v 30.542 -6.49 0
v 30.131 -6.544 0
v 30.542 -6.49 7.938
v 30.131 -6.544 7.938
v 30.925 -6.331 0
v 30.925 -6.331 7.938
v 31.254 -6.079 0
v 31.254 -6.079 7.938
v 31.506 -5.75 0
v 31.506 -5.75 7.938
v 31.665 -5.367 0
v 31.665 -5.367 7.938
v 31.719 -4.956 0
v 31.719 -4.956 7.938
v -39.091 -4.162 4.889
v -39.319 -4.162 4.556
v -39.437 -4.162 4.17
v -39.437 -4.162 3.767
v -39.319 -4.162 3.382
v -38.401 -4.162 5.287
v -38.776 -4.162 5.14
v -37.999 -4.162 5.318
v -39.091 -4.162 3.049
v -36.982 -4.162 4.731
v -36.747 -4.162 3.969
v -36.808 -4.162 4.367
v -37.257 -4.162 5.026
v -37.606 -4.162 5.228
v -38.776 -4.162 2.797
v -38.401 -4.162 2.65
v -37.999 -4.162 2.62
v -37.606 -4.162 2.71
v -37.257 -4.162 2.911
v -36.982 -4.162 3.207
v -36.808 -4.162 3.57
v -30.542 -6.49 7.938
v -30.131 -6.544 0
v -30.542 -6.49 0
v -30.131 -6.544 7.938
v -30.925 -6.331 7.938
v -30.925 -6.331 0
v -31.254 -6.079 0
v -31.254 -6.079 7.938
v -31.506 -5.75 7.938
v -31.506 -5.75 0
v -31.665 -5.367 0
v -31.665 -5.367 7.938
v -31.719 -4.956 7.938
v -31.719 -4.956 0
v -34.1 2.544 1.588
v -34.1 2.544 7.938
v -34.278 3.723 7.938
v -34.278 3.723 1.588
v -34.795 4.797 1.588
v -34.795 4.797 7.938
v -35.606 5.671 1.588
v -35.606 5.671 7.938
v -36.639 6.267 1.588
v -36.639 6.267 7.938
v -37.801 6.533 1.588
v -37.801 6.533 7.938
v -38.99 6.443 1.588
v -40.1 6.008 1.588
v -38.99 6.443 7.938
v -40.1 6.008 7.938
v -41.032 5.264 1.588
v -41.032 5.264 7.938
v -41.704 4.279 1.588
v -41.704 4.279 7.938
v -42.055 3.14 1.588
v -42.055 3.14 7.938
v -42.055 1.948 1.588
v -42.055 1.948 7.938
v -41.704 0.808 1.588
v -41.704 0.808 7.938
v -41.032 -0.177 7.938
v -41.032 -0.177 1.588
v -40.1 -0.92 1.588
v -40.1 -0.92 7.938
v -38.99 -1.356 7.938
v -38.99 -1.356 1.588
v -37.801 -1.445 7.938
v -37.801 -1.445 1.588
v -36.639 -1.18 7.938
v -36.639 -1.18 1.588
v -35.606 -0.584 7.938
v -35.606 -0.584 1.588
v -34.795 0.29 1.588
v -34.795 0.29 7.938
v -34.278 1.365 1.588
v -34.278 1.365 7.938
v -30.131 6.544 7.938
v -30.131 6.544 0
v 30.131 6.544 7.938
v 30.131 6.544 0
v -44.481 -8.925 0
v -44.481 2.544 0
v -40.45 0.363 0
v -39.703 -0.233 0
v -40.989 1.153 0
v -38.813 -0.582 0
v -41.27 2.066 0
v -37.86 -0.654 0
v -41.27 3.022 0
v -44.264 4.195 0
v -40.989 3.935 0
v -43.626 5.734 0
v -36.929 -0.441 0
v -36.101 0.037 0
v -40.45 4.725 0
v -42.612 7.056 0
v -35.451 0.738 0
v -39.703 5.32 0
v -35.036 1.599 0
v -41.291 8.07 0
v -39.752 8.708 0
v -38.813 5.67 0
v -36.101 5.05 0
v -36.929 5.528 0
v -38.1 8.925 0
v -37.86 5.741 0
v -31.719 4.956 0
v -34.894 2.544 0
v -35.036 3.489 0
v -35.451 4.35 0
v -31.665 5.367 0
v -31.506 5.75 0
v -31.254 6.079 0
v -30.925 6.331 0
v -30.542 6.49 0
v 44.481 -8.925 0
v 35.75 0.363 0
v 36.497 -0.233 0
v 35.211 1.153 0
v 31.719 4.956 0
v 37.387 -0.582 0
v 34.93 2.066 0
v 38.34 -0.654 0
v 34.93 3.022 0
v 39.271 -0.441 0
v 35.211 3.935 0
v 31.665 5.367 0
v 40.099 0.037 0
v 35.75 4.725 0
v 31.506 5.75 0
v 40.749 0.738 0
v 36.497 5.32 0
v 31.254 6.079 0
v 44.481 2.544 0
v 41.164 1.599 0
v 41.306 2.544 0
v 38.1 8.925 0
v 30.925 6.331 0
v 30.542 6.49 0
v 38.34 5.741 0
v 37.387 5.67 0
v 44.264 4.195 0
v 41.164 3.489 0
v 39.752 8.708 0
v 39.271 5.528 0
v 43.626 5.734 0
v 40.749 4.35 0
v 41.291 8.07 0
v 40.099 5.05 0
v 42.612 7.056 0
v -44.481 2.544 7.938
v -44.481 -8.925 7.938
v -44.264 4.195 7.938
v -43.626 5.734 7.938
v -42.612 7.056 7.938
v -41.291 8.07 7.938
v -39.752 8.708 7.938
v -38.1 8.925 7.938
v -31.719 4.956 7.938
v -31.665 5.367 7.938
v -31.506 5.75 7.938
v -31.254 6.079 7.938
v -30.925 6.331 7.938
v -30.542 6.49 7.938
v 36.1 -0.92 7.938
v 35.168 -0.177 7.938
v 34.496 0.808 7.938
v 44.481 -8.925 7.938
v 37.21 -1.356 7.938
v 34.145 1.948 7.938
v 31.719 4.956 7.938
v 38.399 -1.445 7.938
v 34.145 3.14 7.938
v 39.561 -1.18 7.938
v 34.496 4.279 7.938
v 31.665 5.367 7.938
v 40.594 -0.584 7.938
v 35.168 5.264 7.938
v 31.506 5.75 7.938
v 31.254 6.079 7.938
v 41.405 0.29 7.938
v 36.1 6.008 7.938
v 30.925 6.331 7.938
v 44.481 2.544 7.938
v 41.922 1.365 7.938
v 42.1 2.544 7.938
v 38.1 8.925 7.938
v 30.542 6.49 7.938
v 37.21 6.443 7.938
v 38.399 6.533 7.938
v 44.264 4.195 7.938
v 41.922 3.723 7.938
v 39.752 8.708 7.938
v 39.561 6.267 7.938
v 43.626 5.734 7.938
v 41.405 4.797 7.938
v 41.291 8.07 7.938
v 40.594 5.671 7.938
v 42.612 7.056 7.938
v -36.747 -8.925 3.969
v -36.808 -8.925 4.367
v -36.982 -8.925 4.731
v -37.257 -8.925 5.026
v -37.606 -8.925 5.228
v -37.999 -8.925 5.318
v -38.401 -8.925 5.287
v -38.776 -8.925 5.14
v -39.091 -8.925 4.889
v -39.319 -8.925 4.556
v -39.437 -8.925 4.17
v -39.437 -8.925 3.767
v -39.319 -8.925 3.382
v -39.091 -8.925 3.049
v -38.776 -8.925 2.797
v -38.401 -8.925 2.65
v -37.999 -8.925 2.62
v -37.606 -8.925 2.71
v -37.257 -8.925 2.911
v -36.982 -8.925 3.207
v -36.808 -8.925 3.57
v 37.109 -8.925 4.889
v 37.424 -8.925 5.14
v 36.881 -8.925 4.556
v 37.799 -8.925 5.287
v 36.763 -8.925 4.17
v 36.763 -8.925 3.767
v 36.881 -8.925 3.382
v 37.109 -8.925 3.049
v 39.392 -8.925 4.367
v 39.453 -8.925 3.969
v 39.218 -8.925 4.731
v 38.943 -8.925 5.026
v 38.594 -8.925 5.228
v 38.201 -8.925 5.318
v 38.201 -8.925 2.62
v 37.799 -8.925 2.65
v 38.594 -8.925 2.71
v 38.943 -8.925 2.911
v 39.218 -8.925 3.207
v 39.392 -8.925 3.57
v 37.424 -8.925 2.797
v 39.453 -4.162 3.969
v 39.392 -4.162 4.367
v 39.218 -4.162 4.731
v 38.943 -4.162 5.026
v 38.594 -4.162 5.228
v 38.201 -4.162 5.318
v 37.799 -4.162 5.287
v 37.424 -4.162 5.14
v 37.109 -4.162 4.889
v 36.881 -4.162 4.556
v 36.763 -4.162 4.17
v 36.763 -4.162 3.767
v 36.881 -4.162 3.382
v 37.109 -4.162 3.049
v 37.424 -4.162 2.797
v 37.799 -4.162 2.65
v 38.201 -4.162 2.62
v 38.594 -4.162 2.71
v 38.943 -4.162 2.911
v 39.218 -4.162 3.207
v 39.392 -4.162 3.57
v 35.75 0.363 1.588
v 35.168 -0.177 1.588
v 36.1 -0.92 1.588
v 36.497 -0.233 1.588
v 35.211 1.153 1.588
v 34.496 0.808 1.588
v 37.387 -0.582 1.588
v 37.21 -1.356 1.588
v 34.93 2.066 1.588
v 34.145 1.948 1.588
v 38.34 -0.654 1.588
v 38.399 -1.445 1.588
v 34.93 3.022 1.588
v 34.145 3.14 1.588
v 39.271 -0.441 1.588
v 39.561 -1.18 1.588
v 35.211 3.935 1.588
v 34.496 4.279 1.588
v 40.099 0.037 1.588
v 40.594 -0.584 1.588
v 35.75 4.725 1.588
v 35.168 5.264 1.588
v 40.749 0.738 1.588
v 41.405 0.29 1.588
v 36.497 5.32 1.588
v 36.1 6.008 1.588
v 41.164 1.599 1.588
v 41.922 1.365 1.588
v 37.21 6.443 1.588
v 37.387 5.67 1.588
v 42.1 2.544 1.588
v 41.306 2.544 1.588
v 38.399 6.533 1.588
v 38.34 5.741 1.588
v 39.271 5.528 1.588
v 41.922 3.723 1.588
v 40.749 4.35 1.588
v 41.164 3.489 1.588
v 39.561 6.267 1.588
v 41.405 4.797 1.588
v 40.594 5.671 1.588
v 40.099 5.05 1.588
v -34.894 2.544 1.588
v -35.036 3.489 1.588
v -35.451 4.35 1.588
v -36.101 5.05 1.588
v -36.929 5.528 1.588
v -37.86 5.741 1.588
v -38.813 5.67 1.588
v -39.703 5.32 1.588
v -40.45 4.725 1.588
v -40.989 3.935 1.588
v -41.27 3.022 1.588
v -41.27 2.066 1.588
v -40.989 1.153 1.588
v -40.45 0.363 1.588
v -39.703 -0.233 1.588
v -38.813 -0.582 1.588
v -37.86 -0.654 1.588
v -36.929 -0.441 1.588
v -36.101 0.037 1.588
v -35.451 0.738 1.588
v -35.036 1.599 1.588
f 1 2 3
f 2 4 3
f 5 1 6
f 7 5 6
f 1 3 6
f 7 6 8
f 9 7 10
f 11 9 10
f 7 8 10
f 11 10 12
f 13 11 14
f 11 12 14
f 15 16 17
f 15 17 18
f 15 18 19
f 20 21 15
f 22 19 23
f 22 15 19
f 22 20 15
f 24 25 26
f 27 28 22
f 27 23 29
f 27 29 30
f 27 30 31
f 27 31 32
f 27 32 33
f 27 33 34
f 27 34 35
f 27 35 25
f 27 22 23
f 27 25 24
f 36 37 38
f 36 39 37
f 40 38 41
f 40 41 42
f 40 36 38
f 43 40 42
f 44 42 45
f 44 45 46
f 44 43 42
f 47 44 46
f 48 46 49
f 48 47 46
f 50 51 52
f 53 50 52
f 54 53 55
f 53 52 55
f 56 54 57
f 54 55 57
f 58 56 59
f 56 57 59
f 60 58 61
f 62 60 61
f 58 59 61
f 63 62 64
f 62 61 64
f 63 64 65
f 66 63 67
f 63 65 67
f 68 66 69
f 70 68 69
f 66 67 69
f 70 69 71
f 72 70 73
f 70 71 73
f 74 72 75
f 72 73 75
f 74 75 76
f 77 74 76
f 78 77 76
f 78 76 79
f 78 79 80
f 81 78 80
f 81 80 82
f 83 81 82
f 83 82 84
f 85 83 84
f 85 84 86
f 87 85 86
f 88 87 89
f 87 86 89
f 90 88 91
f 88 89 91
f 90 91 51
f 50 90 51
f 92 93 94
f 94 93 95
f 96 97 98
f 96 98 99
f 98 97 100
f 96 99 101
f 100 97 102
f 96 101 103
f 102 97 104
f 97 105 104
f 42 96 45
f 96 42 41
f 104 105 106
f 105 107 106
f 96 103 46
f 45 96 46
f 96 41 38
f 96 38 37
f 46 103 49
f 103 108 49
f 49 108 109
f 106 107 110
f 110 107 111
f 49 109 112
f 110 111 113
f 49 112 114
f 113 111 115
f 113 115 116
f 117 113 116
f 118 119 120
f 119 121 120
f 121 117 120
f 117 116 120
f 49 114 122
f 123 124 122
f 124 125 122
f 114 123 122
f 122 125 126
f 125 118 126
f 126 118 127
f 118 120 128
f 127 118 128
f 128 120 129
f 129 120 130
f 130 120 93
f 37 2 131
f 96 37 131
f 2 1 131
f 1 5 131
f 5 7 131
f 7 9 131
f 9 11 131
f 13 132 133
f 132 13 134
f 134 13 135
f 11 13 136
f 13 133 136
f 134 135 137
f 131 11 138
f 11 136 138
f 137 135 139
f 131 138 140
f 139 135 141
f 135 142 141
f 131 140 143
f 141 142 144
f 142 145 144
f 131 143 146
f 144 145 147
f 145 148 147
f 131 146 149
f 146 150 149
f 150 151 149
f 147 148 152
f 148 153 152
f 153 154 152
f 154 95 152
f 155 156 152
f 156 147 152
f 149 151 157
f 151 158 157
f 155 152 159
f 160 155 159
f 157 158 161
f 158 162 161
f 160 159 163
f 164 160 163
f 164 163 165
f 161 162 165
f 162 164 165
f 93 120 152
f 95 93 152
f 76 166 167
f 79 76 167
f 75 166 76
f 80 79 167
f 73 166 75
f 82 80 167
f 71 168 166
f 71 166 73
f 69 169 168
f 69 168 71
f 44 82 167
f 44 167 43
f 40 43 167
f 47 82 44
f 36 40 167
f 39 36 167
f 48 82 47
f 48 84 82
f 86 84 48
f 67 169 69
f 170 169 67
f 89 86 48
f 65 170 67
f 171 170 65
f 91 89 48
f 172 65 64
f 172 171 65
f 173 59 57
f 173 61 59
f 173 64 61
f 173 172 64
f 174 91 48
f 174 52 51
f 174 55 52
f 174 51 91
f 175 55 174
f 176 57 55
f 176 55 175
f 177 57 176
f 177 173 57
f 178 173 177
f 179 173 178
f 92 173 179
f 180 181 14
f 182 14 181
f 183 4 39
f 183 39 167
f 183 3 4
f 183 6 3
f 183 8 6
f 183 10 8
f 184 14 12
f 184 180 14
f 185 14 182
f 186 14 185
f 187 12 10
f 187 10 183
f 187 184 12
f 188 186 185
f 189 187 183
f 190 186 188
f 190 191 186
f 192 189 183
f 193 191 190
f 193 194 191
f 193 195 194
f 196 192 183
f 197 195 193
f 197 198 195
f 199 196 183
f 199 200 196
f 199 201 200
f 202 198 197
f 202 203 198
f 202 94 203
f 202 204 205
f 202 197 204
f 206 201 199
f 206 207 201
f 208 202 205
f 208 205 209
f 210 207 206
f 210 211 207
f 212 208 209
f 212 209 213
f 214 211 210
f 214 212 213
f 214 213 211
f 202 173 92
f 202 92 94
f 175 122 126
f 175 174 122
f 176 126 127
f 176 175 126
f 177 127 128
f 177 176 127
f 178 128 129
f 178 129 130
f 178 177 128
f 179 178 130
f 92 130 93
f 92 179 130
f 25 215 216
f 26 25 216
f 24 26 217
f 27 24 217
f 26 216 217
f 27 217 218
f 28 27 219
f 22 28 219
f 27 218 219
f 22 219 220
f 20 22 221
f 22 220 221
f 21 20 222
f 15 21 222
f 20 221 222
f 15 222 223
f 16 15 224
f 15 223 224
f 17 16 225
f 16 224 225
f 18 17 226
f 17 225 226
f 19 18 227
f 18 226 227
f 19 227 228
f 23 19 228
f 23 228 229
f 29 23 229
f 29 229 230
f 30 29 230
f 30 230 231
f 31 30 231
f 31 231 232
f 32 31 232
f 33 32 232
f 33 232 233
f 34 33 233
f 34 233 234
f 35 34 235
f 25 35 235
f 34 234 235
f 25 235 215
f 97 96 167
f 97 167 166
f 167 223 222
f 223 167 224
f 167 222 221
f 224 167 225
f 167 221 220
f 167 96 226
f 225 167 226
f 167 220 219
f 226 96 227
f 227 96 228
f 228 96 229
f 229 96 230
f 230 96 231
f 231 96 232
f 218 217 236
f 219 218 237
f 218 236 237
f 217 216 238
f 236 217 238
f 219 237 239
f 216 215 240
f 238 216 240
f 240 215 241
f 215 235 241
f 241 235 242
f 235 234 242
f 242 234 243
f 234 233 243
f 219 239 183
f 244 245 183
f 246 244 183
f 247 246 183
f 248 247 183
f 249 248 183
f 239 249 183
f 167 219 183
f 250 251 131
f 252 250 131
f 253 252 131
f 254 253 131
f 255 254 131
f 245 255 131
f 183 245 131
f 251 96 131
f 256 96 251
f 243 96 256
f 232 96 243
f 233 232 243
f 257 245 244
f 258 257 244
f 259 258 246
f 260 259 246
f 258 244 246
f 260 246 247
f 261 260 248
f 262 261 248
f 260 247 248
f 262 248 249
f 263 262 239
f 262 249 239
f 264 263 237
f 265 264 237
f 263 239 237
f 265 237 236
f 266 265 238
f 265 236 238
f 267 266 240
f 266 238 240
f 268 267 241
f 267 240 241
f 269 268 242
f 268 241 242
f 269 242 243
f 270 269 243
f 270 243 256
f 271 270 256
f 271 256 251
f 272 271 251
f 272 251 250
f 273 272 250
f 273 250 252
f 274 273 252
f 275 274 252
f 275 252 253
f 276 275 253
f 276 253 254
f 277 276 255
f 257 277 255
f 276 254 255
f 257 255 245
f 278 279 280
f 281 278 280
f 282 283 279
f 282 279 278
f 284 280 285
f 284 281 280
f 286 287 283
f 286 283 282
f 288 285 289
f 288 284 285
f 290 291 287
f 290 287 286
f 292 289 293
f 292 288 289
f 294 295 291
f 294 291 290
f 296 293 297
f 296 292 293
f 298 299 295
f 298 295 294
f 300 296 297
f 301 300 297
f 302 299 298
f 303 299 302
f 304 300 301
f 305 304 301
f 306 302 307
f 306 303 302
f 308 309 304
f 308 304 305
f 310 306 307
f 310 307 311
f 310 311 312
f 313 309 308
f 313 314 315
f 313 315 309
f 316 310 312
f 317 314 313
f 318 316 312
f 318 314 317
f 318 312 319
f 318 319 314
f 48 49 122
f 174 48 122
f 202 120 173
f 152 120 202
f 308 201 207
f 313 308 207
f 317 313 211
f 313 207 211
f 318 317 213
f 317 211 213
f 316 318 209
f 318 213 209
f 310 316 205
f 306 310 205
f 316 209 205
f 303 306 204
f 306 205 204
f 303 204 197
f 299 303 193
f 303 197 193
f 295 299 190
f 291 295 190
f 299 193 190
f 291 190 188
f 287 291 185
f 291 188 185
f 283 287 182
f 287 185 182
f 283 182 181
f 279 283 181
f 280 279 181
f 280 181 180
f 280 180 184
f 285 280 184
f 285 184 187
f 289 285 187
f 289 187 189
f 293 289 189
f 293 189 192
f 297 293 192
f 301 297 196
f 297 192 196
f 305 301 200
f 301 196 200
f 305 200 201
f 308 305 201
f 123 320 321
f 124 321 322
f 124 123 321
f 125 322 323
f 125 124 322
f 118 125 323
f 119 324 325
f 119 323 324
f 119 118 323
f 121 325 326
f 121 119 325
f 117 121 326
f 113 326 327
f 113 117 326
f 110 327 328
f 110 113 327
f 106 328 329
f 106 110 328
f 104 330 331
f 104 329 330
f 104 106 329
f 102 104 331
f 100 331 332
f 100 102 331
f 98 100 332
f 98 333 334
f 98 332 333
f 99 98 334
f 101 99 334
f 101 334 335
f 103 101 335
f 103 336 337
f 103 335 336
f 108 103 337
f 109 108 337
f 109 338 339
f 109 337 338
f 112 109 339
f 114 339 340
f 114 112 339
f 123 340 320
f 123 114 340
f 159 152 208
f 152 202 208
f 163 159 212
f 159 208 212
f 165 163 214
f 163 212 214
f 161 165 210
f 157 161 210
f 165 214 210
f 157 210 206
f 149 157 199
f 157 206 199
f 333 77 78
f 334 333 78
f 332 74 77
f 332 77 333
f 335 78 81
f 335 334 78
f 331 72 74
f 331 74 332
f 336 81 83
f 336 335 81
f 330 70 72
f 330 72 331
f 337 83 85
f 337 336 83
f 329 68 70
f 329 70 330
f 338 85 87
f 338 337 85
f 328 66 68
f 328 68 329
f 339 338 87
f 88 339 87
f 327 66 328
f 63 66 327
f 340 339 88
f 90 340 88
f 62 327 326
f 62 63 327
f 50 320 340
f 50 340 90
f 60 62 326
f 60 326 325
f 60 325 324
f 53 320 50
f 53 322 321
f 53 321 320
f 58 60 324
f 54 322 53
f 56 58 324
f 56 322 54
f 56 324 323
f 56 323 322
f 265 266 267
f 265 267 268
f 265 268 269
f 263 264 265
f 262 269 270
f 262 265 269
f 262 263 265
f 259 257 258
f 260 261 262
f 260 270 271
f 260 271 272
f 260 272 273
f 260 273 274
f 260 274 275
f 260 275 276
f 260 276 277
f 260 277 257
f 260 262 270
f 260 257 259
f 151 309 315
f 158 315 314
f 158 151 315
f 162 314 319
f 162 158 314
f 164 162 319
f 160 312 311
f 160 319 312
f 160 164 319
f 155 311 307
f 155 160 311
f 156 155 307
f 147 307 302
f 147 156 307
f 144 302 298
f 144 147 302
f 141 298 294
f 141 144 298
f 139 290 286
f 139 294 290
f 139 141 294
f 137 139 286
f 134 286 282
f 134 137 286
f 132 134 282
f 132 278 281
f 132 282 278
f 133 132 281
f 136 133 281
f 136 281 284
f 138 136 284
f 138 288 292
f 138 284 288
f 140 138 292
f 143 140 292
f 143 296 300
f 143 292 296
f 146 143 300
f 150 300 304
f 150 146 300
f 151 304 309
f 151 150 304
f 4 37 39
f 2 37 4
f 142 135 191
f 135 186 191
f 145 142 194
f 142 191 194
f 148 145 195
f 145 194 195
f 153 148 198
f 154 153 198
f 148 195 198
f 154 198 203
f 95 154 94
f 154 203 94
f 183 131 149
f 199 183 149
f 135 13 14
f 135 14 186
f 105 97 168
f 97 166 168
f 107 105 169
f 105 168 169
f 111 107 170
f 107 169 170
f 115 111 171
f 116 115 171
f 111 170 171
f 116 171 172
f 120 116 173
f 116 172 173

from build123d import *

# Parameters (mm, degrees)
F0_W     = 88.9625
F0_H     = 17.849998
F0_R     = 3.20625
F0_W_2   = 63.4375
F0_H_2   = 13.087498
F1_DEPTH = 7.9375
F3_R     = 4
F4_DEPTH = 6.35
F5_R     = 1.35255
F6_DEPTH = 4.7625
F7_R     = 1.5875
F8_R     = 6.381242


with BuildPart() as f1:
    # F0 (on Top) → F1 (new body)
    with BuildSketch(Plane.XY):
        Rectangle(F0_W, F0_H)
        with Locations((-38.1, 2.543749)):
            Circle(F0_R, mode=Mode.SUBTRACT)
        Rectangle(F0_W_2, F0_H_2, mode=Mode.SUBTRACT)
        with Locations((38.1, 2.543749)):
            Circle(F0_R, mode=Mode.SUBTRACT)
    extrude(amount=F1_DEPTH)

    # F3 (on face) → F4 (cut, through all)
    with BuildSketch(Plane.XY.offset(7.9375)):
        with Locations((-38.1, 2.543749)):
            Circle(F3_R)
        with Locations((38.1, 2.543749)):
            Circle(F3_R)
    extrude(amount=-F4_DEPTH, mode=Mode.SUBTRACT)

    # F5 (on face) → F6 (cut)
    with BuildSketch(Plane.XZ.offset(8.924999)):
        with Locations((-38.1, 3.96875)):
            Circle(F5_R)
        with Locations((38.1, 3.96875)):
            Circle(F5_R)
    extrude(amount=-F6_DEPTH, mode=Mode.SUBTRACT)

    # F7
    f7_edges = [f1.edges().sort_by_distance(p)[0] for p in [
        (31.71875, 6.543749, 3.96875),
        (31.71875, -6.543749, 3.96875),
        (-31.71875, -6.543749, 3.96875),
        (-31.71875, 6.543749, 3.96875),
    ]]
    fillet(f7_edges, radius=F7_R)

    # F8
    f8_edges = [f1.edges().sort_by_distance(p)[0] for p in [
        (44.48125, 8.924999, 3.96875),
        (-44.48125, 8.924999, 3.96875),
    ]]
    fillet(f8_edges, radius=F8_R)


solid = f1.part
